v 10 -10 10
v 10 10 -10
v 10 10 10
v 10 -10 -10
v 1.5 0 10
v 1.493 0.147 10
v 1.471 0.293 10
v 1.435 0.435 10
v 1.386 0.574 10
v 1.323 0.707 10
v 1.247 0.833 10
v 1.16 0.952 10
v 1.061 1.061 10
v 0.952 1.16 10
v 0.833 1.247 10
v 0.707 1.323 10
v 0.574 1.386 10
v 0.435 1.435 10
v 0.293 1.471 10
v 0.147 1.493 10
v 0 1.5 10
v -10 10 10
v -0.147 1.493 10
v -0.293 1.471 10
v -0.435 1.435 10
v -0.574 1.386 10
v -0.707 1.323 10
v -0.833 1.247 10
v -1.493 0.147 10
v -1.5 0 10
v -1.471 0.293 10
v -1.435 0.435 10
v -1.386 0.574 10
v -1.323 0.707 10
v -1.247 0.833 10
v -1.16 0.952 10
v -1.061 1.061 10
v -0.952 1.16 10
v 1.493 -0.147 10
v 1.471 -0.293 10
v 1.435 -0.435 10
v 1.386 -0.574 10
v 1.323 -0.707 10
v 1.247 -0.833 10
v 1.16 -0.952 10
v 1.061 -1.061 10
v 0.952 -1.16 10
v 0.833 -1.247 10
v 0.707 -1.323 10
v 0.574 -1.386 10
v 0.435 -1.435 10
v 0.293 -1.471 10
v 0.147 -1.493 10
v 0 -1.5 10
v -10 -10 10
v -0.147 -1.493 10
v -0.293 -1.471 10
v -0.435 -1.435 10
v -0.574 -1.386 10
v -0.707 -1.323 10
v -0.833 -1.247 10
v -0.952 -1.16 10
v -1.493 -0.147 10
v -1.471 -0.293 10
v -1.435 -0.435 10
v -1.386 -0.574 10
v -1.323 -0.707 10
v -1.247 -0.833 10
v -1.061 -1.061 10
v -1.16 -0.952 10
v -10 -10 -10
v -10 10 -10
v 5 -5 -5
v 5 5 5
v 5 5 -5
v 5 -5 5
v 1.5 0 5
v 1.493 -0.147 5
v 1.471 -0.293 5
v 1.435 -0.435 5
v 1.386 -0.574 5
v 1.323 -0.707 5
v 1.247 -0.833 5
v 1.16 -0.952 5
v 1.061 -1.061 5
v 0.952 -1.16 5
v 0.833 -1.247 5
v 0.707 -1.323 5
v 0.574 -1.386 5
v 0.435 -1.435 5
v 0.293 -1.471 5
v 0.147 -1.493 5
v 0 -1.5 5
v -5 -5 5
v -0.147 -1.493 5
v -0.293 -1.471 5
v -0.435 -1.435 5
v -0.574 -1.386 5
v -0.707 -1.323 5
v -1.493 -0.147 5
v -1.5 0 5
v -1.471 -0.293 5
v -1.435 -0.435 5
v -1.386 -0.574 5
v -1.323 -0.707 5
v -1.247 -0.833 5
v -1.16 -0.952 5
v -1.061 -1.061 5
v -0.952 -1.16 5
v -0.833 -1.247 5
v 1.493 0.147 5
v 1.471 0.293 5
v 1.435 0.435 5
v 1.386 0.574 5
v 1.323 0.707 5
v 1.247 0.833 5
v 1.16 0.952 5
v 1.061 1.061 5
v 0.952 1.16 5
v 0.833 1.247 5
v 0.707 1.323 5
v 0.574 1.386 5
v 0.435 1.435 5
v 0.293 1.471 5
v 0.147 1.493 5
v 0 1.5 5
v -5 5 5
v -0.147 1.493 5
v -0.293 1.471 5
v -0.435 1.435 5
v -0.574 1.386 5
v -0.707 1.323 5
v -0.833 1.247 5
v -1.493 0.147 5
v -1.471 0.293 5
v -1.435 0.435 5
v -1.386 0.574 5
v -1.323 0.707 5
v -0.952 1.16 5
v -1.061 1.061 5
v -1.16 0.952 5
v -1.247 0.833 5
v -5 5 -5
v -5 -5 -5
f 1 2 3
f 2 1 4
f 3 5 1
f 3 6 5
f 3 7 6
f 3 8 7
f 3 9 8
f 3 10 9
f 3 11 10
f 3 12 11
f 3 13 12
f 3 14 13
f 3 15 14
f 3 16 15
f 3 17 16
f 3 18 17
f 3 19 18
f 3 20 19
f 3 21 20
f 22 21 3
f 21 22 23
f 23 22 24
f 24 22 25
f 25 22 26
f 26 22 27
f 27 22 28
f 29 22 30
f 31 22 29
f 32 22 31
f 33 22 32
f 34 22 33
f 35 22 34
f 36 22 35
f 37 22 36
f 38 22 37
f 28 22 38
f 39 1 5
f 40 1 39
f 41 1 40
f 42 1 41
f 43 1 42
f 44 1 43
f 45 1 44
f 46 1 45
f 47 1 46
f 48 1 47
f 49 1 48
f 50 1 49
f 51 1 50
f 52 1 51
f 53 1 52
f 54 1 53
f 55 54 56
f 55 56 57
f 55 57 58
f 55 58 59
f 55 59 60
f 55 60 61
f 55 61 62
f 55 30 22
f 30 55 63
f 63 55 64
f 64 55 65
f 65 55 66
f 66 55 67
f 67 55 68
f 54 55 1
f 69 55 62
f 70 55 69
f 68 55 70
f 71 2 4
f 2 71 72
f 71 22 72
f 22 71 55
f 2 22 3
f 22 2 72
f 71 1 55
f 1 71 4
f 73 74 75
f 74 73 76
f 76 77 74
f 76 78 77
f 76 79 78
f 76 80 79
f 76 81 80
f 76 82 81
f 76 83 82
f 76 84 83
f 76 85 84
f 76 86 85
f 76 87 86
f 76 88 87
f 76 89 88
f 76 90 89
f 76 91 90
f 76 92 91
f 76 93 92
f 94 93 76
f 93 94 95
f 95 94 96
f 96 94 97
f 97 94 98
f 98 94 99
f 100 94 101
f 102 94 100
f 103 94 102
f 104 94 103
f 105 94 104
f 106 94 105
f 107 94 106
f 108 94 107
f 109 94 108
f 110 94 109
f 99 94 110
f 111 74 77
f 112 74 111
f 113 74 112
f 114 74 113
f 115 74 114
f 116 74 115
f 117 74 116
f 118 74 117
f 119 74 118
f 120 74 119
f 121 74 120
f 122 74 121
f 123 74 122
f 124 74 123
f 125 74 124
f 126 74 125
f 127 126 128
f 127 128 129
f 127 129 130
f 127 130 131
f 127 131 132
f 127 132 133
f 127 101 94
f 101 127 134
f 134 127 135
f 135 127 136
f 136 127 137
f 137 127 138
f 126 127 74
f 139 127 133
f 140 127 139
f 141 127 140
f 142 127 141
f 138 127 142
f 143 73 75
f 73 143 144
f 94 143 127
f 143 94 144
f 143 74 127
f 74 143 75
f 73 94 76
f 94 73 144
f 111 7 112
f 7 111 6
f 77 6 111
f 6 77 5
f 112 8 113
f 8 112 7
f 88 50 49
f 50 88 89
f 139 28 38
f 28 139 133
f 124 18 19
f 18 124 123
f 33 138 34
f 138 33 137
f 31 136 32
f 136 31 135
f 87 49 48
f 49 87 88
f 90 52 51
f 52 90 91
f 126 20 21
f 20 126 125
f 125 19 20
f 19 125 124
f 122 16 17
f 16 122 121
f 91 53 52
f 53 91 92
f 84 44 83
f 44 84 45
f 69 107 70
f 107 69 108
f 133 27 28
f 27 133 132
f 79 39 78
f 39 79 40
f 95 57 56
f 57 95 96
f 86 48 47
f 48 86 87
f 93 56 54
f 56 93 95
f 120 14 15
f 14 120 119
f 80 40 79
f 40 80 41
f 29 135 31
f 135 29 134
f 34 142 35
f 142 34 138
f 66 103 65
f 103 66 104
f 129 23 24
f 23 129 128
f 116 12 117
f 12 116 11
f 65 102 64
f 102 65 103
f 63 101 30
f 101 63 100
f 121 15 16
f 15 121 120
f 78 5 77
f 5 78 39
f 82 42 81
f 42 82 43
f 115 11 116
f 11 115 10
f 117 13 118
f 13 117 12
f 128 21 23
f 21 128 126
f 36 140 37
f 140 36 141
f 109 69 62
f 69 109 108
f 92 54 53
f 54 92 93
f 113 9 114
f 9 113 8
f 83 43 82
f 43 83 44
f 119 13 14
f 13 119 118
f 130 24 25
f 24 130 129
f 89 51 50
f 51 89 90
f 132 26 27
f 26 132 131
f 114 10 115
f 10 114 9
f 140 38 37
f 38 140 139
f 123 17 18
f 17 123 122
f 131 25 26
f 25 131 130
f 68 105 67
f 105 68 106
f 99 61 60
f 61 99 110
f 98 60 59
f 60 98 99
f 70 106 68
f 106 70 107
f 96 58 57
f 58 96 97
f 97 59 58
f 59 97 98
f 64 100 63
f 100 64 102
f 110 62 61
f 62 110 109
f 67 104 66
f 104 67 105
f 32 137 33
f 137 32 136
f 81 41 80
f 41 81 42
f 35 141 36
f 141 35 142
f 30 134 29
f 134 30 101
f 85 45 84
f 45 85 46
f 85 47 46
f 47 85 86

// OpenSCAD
// A cored block: a cube with a smaller concentric cube removed.
//
// The core is a fully enclosed cavity, which is a second, separate shell: the
// part is watertight but is not one solid. A vent bore breaks the cavity out
// through the top face so the model is a single shell. The bore costs
// pi*(vent/2)^2 * (body - core)/2 = ~35 mm3, well inside the 1% volume band.

body = 20;
core = 10;
vent = 3;

difference() {
    cube([body, body, body], center = true);
    cube([core, core, core], center = true);

    // Bore from the core's top face out through the block's top face.
    // Overshoot both ends so no cut face is coplanar with a kept face.
    translate([0, 0, core / 2 - 1])
        cylinder(h = (body - core) / 2 + 2, d = vent, $fn = 64);
}
